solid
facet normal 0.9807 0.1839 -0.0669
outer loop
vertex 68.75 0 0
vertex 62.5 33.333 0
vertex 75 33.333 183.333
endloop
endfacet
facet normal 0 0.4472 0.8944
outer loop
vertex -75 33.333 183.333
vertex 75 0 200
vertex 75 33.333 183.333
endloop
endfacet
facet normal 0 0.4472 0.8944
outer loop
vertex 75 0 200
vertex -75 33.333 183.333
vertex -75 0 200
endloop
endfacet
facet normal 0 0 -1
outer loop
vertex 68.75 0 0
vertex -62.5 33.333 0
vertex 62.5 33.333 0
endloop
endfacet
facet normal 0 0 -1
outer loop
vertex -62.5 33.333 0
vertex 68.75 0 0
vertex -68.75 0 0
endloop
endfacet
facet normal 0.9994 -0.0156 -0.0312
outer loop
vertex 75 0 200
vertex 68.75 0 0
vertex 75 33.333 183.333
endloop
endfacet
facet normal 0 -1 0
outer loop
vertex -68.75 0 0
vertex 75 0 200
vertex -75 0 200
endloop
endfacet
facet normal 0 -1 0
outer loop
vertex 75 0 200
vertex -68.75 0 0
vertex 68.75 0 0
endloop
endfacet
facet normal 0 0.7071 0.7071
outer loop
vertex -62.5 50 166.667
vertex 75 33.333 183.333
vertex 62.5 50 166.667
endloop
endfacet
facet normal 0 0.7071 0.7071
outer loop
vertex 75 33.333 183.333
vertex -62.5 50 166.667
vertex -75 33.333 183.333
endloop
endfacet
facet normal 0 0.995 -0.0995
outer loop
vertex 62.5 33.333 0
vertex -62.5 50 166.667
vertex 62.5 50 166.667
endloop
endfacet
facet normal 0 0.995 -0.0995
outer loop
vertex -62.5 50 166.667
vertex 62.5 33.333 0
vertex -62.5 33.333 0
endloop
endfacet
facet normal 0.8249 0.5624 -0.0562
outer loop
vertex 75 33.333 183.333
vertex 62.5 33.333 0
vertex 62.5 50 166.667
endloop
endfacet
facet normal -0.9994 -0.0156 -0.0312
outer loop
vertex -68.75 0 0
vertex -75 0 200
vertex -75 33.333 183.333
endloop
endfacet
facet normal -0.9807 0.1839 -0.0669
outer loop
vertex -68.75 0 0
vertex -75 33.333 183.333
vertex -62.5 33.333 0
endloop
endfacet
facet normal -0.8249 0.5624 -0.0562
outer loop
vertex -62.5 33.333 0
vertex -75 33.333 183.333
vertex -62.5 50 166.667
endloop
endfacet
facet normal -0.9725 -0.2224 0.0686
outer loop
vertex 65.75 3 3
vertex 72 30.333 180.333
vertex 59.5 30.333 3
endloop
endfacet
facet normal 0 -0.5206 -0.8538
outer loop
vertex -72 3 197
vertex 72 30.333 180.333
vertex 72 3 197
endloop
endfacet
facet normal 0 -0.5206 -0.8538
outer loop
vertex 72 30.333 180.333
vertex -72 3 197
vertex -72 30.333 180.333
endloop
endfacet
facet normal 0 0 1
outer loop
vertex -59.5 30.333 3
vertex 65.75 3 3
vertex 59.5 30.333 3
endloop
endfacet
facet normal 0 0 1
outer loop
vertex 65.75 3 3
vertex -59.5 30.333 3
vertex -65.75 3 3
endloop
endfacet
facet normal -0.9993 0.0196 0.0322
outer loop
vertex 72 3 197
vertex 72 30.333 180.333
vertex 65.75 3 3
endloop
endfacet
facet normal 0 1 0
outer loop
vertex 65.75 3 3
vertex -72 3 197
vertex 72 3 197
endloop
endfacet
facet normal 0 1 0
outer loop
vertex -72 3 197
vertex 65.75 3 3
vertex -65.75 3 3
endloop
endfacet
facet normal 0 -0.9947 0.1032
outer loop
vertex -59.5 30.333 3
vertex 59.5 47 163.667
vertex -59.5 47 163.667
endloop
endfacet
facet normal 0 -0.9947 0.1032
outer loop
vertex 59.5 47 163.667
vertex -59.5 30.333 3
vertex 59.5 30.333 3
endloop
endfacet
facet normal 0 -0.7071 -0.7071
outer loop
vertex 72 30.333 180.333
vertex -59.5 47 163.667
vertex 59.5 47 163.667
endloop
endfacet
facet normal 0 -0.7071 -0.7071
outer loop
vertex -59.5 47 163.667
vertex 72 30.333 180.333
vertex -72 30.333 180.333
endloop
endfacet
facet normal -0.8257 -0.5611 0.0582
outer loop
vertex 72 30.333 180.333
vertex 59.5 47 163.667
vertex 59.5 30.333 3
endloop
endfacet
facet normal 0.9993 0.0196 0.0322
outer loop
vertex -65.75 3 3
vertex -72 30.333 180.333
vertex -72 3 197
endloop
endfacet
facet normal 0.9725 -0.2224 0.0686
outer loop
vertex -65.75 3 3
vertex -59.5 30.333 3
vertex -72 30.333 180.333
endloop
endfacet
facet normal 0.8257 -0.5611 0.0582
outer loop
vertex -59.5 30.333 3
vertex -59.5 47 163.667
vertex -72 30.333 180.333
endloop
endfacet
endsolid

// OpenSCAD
width=50;
height=200;
length=150;
thickness=3;

garbage_container();

module showPoints(v) {
    for (i = [0: len(v)-1]) {
        translate(v[i]) color("red") 
        text(str(i), font = "Courier New", size=5);
         
    }
}

module garbage_hooks(w=width) {
    points=[
        [0,0],
        [0,5],
        [10,5],
        [10,10],
        [15,10],
        [15,0]
    ];
    showPoints(points);
    polygon(points);
}

module garbage_container(l=length, w=width, h=height, t=thickness) {
    difference() {
        garbage_filled(l,w,h,0);
        translate([0,t,t]) {
            garbage_filled(l,w,h,t);
        };
    };
}

module garbage_filled(l=length, w=width, h=height, t=0) {

    h1=h-2*t;
    h2=h*11/12-2*t;
    h3=h*10/12-2*t;

    r1=l/2-t;
    r2=l*11/12/2-t;
    r3=l*10/12/2-t;

    w1=w-2*t;
    w2=w*2/3-2*t;
    w3=w*1/3-2*t;

    top_back_right=[r1,0,h1];
    top_middle_right=[r1,w2,h2];
    top_front_right=[r3,w1,h3];
    top_back_center=[0,0,h1];
    top_middle_center=[0,w2,h2];
    top_front_center=[0,w1,h3];
    bot_back_right=[r2,0,0];
    bot_front_right=[r3,w2,0];
    bot_back_center=[0,0,0];
    bot_front_center=[0,w2,0];

    points=[
        top_back_right,     // 0
        top_middle_right,   // 1
        top_front_right,    // 2
        top_back_center,    // 3
        top_middle_center,  // 4
        top_front_center,   // 5
        bot_back_right,     // 6
        bot_front_right,    // 7
        bot_back_center,    // 8
        bot_front_center    // 9
    ];

    left_face=[8,9,5,4,3];
    right_face=[0,1,7,6];
    right_front_face=[1,2,7];
    top_face=[3,4,1,0];
    top_front_face=[4,5,2,1];
    bot_face=[6,7,9,8];
    front_face=[2,5,9,7];
    back_face=[6,8,3,0];

    faces=[
        right_face,
        right_front_face,
        front_face,
        bot_face,
        left_face,
        back_face,
        top_face,
        top_front_face
    ];

    trans=[0,0,h];

    add_points=[
        top_back_right,     // 0
        top_middle_right,   // 1
        top_front_right,    // 2
        top_back_center,    // 3
        top_middle_center,  // 4
        top_front_center,   // 5
        trans+top_back_right,     // 0
        trans+top_middle_right,   // 1
        trans+top_front_right,    // 2
        trans+top_back_center,    // 3
        trans+top_middle_center,  // 4
        trans+top_front_center    // 5
    ];
    //showPoints(add_points);
    add_faces=[
        [11,10,9,3,4,5],
        [2,8,11,5],
        [6,7,8,2,1,0],
        [0,1,2,5,4,3],
        [0,3,9,6],
        [9,10,7,6],
        [10,11,8,7]
    ];

    union() {
        polyhedron(points=points, faces=faces);
        mirror([1,0,0])polyhedron(points=points, faces=faces);
        if (t!=0) {
            polyhedron(points=add_points, faces=add_faces);
            mirror([1,0,0])polyhedron(points=add_points, faces=add_faces);
        };
    };

};
